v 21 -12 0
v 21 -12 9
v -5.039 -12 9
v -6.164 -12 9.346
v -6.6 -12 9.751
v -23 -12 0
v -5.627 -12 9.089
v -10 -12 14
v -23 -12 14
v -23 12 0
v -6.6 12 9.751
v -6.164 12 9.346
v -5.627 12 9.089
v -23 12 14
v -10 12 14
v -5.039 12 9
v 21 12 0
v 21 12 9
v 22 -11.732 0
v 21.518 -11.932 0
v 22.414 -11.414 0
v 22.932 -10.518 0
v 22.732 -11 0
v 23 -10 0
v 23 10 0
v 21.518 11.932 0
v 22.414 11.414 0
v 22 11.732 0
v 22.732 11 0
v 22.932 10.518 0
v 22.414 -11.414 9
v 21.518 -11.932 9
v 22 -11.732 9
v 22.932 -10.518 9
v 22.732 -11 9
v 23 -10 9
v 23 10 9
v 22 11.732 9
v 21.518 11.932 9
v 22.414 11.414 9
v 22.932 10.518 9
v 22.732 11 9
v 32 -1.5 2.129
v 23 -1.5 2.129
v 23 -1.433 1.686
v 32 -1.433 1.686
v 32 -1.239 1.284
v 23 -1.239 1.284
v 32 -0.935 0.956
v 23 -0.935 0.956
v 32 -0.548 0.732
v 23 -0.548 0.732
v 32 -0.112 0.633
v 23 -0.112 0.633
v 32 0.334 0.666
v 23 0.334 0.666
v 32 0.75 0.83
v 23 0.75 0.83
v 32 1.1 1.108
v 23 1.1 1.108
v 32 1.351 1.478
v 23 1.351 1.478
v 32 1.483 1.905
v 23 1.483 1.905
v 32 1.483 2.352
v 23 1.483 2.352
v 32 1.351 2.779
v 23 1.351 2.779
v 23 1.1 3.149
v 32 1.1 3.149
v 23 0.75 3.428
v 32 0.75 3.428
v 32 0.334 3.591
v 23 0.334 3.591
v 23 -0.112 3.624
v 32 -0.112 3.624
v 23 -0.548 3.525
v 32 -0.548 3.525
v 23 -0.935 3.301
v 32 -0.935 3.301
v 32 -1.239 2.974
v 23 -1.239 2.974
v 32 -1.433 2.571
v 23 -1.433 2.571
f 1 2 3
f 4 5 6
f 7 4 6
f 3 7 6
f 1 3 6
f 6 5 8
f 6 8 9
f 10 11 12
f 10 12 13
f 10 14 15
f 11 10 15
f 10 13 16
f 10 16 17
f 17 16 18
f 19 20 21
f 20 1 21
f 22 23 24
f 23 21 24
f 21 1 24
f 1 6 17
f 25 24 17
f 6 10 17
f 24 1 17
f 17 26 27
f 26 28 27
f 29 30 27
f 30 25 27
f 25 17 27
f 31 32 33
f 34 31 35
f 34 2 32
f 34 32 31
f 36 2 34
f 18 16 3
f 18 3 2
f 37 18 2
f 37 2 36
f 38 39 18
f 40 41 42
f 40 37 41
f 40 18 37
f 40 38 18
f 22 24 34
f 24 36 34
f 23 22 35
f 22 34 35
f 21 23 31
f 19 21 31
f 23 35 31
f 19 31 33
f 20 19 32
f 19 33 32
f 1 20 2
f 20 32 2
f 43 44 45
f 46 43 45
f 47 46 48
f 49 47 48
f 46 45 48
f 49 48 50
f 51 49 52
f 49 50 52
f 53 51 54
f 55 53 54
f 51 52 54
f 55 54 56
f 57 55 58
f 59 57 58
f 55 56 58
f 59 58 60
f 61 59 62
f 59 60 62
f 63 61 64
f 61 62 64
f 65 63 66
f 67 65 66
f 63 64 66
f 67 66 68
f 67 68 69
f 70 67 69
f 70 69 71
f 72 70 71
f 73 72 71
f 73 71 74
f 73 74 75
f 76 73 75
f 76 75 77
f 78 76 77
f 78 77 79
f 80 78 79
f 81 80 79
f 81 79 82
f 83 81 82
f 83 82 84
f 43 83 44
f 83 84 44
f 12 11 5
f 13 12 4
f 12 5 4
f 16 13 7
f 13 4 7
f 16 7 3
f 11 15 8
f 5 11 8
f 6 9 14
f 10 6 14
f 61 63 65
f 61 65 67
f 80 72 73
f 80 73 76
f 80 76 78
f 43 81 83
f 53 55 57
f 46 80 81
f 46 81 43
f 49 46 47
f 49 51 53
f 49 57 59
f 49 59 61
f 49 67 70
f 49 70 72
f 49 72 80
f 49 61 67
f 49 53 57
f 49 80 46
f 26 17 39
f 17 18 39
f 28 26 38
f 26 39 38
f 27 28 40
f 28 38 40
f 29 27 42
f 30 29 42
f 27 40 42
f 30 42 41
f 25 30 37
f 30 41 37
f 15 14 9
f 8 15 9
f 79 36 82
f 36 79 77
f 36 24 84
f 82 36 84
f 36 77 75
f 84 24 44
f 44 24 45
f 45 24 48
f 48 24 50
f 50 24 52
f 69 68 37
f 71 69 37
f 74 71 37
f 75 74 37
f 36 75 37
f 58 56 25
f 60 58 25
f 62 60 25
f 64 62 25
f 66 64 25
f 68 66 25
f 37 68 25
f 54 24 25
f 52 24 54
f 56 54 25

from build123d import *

# Parameters (mm, degrees)
SKETCH_1_W      = 46
SKETCH_1_H      = 24
EXTRUDE_1_DEPTH = 9
SKETCH_4_R      = 1.5
EXTRUDE_2_DEPTH = 9
FILLET_1_R      = 2


with BuildPart() as part:
    # Эскиз1 → Бобышка-Вытянуть1 (new body)
    with BuildSketch(Plane.XY):
        Rectangle(SKETCH_1_W, SKETCH_1_H)
    extrude(amount=EXTRUDE_1_DEPTH)

    # Эскиз2 → По сечениям1 section 0
    with BuildSketch(Plane.XY.offset(9)):
        with BuildLine():
            Line((-23, 12), (-6, 12))
            Line((-6, 12), (-6, -12))
            Line((-6, -12), (-23, -12))
            Line((-23, -12), (-23, 12))
        make_face()
    # Эскиз3 → По сечениям1 section 1
    with BuildSketch(Plane.XY.offset(14)):
        with BuildLine():
            Line((-23, 12), (-10, 12))
            Line((-10, 12), (-10, -12))
            Line((-10, -12), (-23, -12))
            Line((-23, -12), (-23, 12))
        make_face()
    loft()

    # Эскиз4 → Бобышка-Вытянуть2 (add)
    with BuildSketch(Plane(origin=(23, 0, 0), x_dir=(0, 0, -1), z_dir=(1, 0, 0))):
        with Locations(Location((-2.128573829, 0, 0), (0, 0, 270))):
            Circle(SKETCH_4_R)
    extrude(amount=EXTRUDE_2_DEPTH)

    # Скругление1
    fillet_1_edges = [part.edges().sort_by_distance(p)[0] for p in [
        (-6, 0, 9),
        (23, -12, 4.5),
        (23, 12, 4.5),
    ]]
    fillet(fillet_1_edges, radius=FILLET_1_R)


solid = part.part
